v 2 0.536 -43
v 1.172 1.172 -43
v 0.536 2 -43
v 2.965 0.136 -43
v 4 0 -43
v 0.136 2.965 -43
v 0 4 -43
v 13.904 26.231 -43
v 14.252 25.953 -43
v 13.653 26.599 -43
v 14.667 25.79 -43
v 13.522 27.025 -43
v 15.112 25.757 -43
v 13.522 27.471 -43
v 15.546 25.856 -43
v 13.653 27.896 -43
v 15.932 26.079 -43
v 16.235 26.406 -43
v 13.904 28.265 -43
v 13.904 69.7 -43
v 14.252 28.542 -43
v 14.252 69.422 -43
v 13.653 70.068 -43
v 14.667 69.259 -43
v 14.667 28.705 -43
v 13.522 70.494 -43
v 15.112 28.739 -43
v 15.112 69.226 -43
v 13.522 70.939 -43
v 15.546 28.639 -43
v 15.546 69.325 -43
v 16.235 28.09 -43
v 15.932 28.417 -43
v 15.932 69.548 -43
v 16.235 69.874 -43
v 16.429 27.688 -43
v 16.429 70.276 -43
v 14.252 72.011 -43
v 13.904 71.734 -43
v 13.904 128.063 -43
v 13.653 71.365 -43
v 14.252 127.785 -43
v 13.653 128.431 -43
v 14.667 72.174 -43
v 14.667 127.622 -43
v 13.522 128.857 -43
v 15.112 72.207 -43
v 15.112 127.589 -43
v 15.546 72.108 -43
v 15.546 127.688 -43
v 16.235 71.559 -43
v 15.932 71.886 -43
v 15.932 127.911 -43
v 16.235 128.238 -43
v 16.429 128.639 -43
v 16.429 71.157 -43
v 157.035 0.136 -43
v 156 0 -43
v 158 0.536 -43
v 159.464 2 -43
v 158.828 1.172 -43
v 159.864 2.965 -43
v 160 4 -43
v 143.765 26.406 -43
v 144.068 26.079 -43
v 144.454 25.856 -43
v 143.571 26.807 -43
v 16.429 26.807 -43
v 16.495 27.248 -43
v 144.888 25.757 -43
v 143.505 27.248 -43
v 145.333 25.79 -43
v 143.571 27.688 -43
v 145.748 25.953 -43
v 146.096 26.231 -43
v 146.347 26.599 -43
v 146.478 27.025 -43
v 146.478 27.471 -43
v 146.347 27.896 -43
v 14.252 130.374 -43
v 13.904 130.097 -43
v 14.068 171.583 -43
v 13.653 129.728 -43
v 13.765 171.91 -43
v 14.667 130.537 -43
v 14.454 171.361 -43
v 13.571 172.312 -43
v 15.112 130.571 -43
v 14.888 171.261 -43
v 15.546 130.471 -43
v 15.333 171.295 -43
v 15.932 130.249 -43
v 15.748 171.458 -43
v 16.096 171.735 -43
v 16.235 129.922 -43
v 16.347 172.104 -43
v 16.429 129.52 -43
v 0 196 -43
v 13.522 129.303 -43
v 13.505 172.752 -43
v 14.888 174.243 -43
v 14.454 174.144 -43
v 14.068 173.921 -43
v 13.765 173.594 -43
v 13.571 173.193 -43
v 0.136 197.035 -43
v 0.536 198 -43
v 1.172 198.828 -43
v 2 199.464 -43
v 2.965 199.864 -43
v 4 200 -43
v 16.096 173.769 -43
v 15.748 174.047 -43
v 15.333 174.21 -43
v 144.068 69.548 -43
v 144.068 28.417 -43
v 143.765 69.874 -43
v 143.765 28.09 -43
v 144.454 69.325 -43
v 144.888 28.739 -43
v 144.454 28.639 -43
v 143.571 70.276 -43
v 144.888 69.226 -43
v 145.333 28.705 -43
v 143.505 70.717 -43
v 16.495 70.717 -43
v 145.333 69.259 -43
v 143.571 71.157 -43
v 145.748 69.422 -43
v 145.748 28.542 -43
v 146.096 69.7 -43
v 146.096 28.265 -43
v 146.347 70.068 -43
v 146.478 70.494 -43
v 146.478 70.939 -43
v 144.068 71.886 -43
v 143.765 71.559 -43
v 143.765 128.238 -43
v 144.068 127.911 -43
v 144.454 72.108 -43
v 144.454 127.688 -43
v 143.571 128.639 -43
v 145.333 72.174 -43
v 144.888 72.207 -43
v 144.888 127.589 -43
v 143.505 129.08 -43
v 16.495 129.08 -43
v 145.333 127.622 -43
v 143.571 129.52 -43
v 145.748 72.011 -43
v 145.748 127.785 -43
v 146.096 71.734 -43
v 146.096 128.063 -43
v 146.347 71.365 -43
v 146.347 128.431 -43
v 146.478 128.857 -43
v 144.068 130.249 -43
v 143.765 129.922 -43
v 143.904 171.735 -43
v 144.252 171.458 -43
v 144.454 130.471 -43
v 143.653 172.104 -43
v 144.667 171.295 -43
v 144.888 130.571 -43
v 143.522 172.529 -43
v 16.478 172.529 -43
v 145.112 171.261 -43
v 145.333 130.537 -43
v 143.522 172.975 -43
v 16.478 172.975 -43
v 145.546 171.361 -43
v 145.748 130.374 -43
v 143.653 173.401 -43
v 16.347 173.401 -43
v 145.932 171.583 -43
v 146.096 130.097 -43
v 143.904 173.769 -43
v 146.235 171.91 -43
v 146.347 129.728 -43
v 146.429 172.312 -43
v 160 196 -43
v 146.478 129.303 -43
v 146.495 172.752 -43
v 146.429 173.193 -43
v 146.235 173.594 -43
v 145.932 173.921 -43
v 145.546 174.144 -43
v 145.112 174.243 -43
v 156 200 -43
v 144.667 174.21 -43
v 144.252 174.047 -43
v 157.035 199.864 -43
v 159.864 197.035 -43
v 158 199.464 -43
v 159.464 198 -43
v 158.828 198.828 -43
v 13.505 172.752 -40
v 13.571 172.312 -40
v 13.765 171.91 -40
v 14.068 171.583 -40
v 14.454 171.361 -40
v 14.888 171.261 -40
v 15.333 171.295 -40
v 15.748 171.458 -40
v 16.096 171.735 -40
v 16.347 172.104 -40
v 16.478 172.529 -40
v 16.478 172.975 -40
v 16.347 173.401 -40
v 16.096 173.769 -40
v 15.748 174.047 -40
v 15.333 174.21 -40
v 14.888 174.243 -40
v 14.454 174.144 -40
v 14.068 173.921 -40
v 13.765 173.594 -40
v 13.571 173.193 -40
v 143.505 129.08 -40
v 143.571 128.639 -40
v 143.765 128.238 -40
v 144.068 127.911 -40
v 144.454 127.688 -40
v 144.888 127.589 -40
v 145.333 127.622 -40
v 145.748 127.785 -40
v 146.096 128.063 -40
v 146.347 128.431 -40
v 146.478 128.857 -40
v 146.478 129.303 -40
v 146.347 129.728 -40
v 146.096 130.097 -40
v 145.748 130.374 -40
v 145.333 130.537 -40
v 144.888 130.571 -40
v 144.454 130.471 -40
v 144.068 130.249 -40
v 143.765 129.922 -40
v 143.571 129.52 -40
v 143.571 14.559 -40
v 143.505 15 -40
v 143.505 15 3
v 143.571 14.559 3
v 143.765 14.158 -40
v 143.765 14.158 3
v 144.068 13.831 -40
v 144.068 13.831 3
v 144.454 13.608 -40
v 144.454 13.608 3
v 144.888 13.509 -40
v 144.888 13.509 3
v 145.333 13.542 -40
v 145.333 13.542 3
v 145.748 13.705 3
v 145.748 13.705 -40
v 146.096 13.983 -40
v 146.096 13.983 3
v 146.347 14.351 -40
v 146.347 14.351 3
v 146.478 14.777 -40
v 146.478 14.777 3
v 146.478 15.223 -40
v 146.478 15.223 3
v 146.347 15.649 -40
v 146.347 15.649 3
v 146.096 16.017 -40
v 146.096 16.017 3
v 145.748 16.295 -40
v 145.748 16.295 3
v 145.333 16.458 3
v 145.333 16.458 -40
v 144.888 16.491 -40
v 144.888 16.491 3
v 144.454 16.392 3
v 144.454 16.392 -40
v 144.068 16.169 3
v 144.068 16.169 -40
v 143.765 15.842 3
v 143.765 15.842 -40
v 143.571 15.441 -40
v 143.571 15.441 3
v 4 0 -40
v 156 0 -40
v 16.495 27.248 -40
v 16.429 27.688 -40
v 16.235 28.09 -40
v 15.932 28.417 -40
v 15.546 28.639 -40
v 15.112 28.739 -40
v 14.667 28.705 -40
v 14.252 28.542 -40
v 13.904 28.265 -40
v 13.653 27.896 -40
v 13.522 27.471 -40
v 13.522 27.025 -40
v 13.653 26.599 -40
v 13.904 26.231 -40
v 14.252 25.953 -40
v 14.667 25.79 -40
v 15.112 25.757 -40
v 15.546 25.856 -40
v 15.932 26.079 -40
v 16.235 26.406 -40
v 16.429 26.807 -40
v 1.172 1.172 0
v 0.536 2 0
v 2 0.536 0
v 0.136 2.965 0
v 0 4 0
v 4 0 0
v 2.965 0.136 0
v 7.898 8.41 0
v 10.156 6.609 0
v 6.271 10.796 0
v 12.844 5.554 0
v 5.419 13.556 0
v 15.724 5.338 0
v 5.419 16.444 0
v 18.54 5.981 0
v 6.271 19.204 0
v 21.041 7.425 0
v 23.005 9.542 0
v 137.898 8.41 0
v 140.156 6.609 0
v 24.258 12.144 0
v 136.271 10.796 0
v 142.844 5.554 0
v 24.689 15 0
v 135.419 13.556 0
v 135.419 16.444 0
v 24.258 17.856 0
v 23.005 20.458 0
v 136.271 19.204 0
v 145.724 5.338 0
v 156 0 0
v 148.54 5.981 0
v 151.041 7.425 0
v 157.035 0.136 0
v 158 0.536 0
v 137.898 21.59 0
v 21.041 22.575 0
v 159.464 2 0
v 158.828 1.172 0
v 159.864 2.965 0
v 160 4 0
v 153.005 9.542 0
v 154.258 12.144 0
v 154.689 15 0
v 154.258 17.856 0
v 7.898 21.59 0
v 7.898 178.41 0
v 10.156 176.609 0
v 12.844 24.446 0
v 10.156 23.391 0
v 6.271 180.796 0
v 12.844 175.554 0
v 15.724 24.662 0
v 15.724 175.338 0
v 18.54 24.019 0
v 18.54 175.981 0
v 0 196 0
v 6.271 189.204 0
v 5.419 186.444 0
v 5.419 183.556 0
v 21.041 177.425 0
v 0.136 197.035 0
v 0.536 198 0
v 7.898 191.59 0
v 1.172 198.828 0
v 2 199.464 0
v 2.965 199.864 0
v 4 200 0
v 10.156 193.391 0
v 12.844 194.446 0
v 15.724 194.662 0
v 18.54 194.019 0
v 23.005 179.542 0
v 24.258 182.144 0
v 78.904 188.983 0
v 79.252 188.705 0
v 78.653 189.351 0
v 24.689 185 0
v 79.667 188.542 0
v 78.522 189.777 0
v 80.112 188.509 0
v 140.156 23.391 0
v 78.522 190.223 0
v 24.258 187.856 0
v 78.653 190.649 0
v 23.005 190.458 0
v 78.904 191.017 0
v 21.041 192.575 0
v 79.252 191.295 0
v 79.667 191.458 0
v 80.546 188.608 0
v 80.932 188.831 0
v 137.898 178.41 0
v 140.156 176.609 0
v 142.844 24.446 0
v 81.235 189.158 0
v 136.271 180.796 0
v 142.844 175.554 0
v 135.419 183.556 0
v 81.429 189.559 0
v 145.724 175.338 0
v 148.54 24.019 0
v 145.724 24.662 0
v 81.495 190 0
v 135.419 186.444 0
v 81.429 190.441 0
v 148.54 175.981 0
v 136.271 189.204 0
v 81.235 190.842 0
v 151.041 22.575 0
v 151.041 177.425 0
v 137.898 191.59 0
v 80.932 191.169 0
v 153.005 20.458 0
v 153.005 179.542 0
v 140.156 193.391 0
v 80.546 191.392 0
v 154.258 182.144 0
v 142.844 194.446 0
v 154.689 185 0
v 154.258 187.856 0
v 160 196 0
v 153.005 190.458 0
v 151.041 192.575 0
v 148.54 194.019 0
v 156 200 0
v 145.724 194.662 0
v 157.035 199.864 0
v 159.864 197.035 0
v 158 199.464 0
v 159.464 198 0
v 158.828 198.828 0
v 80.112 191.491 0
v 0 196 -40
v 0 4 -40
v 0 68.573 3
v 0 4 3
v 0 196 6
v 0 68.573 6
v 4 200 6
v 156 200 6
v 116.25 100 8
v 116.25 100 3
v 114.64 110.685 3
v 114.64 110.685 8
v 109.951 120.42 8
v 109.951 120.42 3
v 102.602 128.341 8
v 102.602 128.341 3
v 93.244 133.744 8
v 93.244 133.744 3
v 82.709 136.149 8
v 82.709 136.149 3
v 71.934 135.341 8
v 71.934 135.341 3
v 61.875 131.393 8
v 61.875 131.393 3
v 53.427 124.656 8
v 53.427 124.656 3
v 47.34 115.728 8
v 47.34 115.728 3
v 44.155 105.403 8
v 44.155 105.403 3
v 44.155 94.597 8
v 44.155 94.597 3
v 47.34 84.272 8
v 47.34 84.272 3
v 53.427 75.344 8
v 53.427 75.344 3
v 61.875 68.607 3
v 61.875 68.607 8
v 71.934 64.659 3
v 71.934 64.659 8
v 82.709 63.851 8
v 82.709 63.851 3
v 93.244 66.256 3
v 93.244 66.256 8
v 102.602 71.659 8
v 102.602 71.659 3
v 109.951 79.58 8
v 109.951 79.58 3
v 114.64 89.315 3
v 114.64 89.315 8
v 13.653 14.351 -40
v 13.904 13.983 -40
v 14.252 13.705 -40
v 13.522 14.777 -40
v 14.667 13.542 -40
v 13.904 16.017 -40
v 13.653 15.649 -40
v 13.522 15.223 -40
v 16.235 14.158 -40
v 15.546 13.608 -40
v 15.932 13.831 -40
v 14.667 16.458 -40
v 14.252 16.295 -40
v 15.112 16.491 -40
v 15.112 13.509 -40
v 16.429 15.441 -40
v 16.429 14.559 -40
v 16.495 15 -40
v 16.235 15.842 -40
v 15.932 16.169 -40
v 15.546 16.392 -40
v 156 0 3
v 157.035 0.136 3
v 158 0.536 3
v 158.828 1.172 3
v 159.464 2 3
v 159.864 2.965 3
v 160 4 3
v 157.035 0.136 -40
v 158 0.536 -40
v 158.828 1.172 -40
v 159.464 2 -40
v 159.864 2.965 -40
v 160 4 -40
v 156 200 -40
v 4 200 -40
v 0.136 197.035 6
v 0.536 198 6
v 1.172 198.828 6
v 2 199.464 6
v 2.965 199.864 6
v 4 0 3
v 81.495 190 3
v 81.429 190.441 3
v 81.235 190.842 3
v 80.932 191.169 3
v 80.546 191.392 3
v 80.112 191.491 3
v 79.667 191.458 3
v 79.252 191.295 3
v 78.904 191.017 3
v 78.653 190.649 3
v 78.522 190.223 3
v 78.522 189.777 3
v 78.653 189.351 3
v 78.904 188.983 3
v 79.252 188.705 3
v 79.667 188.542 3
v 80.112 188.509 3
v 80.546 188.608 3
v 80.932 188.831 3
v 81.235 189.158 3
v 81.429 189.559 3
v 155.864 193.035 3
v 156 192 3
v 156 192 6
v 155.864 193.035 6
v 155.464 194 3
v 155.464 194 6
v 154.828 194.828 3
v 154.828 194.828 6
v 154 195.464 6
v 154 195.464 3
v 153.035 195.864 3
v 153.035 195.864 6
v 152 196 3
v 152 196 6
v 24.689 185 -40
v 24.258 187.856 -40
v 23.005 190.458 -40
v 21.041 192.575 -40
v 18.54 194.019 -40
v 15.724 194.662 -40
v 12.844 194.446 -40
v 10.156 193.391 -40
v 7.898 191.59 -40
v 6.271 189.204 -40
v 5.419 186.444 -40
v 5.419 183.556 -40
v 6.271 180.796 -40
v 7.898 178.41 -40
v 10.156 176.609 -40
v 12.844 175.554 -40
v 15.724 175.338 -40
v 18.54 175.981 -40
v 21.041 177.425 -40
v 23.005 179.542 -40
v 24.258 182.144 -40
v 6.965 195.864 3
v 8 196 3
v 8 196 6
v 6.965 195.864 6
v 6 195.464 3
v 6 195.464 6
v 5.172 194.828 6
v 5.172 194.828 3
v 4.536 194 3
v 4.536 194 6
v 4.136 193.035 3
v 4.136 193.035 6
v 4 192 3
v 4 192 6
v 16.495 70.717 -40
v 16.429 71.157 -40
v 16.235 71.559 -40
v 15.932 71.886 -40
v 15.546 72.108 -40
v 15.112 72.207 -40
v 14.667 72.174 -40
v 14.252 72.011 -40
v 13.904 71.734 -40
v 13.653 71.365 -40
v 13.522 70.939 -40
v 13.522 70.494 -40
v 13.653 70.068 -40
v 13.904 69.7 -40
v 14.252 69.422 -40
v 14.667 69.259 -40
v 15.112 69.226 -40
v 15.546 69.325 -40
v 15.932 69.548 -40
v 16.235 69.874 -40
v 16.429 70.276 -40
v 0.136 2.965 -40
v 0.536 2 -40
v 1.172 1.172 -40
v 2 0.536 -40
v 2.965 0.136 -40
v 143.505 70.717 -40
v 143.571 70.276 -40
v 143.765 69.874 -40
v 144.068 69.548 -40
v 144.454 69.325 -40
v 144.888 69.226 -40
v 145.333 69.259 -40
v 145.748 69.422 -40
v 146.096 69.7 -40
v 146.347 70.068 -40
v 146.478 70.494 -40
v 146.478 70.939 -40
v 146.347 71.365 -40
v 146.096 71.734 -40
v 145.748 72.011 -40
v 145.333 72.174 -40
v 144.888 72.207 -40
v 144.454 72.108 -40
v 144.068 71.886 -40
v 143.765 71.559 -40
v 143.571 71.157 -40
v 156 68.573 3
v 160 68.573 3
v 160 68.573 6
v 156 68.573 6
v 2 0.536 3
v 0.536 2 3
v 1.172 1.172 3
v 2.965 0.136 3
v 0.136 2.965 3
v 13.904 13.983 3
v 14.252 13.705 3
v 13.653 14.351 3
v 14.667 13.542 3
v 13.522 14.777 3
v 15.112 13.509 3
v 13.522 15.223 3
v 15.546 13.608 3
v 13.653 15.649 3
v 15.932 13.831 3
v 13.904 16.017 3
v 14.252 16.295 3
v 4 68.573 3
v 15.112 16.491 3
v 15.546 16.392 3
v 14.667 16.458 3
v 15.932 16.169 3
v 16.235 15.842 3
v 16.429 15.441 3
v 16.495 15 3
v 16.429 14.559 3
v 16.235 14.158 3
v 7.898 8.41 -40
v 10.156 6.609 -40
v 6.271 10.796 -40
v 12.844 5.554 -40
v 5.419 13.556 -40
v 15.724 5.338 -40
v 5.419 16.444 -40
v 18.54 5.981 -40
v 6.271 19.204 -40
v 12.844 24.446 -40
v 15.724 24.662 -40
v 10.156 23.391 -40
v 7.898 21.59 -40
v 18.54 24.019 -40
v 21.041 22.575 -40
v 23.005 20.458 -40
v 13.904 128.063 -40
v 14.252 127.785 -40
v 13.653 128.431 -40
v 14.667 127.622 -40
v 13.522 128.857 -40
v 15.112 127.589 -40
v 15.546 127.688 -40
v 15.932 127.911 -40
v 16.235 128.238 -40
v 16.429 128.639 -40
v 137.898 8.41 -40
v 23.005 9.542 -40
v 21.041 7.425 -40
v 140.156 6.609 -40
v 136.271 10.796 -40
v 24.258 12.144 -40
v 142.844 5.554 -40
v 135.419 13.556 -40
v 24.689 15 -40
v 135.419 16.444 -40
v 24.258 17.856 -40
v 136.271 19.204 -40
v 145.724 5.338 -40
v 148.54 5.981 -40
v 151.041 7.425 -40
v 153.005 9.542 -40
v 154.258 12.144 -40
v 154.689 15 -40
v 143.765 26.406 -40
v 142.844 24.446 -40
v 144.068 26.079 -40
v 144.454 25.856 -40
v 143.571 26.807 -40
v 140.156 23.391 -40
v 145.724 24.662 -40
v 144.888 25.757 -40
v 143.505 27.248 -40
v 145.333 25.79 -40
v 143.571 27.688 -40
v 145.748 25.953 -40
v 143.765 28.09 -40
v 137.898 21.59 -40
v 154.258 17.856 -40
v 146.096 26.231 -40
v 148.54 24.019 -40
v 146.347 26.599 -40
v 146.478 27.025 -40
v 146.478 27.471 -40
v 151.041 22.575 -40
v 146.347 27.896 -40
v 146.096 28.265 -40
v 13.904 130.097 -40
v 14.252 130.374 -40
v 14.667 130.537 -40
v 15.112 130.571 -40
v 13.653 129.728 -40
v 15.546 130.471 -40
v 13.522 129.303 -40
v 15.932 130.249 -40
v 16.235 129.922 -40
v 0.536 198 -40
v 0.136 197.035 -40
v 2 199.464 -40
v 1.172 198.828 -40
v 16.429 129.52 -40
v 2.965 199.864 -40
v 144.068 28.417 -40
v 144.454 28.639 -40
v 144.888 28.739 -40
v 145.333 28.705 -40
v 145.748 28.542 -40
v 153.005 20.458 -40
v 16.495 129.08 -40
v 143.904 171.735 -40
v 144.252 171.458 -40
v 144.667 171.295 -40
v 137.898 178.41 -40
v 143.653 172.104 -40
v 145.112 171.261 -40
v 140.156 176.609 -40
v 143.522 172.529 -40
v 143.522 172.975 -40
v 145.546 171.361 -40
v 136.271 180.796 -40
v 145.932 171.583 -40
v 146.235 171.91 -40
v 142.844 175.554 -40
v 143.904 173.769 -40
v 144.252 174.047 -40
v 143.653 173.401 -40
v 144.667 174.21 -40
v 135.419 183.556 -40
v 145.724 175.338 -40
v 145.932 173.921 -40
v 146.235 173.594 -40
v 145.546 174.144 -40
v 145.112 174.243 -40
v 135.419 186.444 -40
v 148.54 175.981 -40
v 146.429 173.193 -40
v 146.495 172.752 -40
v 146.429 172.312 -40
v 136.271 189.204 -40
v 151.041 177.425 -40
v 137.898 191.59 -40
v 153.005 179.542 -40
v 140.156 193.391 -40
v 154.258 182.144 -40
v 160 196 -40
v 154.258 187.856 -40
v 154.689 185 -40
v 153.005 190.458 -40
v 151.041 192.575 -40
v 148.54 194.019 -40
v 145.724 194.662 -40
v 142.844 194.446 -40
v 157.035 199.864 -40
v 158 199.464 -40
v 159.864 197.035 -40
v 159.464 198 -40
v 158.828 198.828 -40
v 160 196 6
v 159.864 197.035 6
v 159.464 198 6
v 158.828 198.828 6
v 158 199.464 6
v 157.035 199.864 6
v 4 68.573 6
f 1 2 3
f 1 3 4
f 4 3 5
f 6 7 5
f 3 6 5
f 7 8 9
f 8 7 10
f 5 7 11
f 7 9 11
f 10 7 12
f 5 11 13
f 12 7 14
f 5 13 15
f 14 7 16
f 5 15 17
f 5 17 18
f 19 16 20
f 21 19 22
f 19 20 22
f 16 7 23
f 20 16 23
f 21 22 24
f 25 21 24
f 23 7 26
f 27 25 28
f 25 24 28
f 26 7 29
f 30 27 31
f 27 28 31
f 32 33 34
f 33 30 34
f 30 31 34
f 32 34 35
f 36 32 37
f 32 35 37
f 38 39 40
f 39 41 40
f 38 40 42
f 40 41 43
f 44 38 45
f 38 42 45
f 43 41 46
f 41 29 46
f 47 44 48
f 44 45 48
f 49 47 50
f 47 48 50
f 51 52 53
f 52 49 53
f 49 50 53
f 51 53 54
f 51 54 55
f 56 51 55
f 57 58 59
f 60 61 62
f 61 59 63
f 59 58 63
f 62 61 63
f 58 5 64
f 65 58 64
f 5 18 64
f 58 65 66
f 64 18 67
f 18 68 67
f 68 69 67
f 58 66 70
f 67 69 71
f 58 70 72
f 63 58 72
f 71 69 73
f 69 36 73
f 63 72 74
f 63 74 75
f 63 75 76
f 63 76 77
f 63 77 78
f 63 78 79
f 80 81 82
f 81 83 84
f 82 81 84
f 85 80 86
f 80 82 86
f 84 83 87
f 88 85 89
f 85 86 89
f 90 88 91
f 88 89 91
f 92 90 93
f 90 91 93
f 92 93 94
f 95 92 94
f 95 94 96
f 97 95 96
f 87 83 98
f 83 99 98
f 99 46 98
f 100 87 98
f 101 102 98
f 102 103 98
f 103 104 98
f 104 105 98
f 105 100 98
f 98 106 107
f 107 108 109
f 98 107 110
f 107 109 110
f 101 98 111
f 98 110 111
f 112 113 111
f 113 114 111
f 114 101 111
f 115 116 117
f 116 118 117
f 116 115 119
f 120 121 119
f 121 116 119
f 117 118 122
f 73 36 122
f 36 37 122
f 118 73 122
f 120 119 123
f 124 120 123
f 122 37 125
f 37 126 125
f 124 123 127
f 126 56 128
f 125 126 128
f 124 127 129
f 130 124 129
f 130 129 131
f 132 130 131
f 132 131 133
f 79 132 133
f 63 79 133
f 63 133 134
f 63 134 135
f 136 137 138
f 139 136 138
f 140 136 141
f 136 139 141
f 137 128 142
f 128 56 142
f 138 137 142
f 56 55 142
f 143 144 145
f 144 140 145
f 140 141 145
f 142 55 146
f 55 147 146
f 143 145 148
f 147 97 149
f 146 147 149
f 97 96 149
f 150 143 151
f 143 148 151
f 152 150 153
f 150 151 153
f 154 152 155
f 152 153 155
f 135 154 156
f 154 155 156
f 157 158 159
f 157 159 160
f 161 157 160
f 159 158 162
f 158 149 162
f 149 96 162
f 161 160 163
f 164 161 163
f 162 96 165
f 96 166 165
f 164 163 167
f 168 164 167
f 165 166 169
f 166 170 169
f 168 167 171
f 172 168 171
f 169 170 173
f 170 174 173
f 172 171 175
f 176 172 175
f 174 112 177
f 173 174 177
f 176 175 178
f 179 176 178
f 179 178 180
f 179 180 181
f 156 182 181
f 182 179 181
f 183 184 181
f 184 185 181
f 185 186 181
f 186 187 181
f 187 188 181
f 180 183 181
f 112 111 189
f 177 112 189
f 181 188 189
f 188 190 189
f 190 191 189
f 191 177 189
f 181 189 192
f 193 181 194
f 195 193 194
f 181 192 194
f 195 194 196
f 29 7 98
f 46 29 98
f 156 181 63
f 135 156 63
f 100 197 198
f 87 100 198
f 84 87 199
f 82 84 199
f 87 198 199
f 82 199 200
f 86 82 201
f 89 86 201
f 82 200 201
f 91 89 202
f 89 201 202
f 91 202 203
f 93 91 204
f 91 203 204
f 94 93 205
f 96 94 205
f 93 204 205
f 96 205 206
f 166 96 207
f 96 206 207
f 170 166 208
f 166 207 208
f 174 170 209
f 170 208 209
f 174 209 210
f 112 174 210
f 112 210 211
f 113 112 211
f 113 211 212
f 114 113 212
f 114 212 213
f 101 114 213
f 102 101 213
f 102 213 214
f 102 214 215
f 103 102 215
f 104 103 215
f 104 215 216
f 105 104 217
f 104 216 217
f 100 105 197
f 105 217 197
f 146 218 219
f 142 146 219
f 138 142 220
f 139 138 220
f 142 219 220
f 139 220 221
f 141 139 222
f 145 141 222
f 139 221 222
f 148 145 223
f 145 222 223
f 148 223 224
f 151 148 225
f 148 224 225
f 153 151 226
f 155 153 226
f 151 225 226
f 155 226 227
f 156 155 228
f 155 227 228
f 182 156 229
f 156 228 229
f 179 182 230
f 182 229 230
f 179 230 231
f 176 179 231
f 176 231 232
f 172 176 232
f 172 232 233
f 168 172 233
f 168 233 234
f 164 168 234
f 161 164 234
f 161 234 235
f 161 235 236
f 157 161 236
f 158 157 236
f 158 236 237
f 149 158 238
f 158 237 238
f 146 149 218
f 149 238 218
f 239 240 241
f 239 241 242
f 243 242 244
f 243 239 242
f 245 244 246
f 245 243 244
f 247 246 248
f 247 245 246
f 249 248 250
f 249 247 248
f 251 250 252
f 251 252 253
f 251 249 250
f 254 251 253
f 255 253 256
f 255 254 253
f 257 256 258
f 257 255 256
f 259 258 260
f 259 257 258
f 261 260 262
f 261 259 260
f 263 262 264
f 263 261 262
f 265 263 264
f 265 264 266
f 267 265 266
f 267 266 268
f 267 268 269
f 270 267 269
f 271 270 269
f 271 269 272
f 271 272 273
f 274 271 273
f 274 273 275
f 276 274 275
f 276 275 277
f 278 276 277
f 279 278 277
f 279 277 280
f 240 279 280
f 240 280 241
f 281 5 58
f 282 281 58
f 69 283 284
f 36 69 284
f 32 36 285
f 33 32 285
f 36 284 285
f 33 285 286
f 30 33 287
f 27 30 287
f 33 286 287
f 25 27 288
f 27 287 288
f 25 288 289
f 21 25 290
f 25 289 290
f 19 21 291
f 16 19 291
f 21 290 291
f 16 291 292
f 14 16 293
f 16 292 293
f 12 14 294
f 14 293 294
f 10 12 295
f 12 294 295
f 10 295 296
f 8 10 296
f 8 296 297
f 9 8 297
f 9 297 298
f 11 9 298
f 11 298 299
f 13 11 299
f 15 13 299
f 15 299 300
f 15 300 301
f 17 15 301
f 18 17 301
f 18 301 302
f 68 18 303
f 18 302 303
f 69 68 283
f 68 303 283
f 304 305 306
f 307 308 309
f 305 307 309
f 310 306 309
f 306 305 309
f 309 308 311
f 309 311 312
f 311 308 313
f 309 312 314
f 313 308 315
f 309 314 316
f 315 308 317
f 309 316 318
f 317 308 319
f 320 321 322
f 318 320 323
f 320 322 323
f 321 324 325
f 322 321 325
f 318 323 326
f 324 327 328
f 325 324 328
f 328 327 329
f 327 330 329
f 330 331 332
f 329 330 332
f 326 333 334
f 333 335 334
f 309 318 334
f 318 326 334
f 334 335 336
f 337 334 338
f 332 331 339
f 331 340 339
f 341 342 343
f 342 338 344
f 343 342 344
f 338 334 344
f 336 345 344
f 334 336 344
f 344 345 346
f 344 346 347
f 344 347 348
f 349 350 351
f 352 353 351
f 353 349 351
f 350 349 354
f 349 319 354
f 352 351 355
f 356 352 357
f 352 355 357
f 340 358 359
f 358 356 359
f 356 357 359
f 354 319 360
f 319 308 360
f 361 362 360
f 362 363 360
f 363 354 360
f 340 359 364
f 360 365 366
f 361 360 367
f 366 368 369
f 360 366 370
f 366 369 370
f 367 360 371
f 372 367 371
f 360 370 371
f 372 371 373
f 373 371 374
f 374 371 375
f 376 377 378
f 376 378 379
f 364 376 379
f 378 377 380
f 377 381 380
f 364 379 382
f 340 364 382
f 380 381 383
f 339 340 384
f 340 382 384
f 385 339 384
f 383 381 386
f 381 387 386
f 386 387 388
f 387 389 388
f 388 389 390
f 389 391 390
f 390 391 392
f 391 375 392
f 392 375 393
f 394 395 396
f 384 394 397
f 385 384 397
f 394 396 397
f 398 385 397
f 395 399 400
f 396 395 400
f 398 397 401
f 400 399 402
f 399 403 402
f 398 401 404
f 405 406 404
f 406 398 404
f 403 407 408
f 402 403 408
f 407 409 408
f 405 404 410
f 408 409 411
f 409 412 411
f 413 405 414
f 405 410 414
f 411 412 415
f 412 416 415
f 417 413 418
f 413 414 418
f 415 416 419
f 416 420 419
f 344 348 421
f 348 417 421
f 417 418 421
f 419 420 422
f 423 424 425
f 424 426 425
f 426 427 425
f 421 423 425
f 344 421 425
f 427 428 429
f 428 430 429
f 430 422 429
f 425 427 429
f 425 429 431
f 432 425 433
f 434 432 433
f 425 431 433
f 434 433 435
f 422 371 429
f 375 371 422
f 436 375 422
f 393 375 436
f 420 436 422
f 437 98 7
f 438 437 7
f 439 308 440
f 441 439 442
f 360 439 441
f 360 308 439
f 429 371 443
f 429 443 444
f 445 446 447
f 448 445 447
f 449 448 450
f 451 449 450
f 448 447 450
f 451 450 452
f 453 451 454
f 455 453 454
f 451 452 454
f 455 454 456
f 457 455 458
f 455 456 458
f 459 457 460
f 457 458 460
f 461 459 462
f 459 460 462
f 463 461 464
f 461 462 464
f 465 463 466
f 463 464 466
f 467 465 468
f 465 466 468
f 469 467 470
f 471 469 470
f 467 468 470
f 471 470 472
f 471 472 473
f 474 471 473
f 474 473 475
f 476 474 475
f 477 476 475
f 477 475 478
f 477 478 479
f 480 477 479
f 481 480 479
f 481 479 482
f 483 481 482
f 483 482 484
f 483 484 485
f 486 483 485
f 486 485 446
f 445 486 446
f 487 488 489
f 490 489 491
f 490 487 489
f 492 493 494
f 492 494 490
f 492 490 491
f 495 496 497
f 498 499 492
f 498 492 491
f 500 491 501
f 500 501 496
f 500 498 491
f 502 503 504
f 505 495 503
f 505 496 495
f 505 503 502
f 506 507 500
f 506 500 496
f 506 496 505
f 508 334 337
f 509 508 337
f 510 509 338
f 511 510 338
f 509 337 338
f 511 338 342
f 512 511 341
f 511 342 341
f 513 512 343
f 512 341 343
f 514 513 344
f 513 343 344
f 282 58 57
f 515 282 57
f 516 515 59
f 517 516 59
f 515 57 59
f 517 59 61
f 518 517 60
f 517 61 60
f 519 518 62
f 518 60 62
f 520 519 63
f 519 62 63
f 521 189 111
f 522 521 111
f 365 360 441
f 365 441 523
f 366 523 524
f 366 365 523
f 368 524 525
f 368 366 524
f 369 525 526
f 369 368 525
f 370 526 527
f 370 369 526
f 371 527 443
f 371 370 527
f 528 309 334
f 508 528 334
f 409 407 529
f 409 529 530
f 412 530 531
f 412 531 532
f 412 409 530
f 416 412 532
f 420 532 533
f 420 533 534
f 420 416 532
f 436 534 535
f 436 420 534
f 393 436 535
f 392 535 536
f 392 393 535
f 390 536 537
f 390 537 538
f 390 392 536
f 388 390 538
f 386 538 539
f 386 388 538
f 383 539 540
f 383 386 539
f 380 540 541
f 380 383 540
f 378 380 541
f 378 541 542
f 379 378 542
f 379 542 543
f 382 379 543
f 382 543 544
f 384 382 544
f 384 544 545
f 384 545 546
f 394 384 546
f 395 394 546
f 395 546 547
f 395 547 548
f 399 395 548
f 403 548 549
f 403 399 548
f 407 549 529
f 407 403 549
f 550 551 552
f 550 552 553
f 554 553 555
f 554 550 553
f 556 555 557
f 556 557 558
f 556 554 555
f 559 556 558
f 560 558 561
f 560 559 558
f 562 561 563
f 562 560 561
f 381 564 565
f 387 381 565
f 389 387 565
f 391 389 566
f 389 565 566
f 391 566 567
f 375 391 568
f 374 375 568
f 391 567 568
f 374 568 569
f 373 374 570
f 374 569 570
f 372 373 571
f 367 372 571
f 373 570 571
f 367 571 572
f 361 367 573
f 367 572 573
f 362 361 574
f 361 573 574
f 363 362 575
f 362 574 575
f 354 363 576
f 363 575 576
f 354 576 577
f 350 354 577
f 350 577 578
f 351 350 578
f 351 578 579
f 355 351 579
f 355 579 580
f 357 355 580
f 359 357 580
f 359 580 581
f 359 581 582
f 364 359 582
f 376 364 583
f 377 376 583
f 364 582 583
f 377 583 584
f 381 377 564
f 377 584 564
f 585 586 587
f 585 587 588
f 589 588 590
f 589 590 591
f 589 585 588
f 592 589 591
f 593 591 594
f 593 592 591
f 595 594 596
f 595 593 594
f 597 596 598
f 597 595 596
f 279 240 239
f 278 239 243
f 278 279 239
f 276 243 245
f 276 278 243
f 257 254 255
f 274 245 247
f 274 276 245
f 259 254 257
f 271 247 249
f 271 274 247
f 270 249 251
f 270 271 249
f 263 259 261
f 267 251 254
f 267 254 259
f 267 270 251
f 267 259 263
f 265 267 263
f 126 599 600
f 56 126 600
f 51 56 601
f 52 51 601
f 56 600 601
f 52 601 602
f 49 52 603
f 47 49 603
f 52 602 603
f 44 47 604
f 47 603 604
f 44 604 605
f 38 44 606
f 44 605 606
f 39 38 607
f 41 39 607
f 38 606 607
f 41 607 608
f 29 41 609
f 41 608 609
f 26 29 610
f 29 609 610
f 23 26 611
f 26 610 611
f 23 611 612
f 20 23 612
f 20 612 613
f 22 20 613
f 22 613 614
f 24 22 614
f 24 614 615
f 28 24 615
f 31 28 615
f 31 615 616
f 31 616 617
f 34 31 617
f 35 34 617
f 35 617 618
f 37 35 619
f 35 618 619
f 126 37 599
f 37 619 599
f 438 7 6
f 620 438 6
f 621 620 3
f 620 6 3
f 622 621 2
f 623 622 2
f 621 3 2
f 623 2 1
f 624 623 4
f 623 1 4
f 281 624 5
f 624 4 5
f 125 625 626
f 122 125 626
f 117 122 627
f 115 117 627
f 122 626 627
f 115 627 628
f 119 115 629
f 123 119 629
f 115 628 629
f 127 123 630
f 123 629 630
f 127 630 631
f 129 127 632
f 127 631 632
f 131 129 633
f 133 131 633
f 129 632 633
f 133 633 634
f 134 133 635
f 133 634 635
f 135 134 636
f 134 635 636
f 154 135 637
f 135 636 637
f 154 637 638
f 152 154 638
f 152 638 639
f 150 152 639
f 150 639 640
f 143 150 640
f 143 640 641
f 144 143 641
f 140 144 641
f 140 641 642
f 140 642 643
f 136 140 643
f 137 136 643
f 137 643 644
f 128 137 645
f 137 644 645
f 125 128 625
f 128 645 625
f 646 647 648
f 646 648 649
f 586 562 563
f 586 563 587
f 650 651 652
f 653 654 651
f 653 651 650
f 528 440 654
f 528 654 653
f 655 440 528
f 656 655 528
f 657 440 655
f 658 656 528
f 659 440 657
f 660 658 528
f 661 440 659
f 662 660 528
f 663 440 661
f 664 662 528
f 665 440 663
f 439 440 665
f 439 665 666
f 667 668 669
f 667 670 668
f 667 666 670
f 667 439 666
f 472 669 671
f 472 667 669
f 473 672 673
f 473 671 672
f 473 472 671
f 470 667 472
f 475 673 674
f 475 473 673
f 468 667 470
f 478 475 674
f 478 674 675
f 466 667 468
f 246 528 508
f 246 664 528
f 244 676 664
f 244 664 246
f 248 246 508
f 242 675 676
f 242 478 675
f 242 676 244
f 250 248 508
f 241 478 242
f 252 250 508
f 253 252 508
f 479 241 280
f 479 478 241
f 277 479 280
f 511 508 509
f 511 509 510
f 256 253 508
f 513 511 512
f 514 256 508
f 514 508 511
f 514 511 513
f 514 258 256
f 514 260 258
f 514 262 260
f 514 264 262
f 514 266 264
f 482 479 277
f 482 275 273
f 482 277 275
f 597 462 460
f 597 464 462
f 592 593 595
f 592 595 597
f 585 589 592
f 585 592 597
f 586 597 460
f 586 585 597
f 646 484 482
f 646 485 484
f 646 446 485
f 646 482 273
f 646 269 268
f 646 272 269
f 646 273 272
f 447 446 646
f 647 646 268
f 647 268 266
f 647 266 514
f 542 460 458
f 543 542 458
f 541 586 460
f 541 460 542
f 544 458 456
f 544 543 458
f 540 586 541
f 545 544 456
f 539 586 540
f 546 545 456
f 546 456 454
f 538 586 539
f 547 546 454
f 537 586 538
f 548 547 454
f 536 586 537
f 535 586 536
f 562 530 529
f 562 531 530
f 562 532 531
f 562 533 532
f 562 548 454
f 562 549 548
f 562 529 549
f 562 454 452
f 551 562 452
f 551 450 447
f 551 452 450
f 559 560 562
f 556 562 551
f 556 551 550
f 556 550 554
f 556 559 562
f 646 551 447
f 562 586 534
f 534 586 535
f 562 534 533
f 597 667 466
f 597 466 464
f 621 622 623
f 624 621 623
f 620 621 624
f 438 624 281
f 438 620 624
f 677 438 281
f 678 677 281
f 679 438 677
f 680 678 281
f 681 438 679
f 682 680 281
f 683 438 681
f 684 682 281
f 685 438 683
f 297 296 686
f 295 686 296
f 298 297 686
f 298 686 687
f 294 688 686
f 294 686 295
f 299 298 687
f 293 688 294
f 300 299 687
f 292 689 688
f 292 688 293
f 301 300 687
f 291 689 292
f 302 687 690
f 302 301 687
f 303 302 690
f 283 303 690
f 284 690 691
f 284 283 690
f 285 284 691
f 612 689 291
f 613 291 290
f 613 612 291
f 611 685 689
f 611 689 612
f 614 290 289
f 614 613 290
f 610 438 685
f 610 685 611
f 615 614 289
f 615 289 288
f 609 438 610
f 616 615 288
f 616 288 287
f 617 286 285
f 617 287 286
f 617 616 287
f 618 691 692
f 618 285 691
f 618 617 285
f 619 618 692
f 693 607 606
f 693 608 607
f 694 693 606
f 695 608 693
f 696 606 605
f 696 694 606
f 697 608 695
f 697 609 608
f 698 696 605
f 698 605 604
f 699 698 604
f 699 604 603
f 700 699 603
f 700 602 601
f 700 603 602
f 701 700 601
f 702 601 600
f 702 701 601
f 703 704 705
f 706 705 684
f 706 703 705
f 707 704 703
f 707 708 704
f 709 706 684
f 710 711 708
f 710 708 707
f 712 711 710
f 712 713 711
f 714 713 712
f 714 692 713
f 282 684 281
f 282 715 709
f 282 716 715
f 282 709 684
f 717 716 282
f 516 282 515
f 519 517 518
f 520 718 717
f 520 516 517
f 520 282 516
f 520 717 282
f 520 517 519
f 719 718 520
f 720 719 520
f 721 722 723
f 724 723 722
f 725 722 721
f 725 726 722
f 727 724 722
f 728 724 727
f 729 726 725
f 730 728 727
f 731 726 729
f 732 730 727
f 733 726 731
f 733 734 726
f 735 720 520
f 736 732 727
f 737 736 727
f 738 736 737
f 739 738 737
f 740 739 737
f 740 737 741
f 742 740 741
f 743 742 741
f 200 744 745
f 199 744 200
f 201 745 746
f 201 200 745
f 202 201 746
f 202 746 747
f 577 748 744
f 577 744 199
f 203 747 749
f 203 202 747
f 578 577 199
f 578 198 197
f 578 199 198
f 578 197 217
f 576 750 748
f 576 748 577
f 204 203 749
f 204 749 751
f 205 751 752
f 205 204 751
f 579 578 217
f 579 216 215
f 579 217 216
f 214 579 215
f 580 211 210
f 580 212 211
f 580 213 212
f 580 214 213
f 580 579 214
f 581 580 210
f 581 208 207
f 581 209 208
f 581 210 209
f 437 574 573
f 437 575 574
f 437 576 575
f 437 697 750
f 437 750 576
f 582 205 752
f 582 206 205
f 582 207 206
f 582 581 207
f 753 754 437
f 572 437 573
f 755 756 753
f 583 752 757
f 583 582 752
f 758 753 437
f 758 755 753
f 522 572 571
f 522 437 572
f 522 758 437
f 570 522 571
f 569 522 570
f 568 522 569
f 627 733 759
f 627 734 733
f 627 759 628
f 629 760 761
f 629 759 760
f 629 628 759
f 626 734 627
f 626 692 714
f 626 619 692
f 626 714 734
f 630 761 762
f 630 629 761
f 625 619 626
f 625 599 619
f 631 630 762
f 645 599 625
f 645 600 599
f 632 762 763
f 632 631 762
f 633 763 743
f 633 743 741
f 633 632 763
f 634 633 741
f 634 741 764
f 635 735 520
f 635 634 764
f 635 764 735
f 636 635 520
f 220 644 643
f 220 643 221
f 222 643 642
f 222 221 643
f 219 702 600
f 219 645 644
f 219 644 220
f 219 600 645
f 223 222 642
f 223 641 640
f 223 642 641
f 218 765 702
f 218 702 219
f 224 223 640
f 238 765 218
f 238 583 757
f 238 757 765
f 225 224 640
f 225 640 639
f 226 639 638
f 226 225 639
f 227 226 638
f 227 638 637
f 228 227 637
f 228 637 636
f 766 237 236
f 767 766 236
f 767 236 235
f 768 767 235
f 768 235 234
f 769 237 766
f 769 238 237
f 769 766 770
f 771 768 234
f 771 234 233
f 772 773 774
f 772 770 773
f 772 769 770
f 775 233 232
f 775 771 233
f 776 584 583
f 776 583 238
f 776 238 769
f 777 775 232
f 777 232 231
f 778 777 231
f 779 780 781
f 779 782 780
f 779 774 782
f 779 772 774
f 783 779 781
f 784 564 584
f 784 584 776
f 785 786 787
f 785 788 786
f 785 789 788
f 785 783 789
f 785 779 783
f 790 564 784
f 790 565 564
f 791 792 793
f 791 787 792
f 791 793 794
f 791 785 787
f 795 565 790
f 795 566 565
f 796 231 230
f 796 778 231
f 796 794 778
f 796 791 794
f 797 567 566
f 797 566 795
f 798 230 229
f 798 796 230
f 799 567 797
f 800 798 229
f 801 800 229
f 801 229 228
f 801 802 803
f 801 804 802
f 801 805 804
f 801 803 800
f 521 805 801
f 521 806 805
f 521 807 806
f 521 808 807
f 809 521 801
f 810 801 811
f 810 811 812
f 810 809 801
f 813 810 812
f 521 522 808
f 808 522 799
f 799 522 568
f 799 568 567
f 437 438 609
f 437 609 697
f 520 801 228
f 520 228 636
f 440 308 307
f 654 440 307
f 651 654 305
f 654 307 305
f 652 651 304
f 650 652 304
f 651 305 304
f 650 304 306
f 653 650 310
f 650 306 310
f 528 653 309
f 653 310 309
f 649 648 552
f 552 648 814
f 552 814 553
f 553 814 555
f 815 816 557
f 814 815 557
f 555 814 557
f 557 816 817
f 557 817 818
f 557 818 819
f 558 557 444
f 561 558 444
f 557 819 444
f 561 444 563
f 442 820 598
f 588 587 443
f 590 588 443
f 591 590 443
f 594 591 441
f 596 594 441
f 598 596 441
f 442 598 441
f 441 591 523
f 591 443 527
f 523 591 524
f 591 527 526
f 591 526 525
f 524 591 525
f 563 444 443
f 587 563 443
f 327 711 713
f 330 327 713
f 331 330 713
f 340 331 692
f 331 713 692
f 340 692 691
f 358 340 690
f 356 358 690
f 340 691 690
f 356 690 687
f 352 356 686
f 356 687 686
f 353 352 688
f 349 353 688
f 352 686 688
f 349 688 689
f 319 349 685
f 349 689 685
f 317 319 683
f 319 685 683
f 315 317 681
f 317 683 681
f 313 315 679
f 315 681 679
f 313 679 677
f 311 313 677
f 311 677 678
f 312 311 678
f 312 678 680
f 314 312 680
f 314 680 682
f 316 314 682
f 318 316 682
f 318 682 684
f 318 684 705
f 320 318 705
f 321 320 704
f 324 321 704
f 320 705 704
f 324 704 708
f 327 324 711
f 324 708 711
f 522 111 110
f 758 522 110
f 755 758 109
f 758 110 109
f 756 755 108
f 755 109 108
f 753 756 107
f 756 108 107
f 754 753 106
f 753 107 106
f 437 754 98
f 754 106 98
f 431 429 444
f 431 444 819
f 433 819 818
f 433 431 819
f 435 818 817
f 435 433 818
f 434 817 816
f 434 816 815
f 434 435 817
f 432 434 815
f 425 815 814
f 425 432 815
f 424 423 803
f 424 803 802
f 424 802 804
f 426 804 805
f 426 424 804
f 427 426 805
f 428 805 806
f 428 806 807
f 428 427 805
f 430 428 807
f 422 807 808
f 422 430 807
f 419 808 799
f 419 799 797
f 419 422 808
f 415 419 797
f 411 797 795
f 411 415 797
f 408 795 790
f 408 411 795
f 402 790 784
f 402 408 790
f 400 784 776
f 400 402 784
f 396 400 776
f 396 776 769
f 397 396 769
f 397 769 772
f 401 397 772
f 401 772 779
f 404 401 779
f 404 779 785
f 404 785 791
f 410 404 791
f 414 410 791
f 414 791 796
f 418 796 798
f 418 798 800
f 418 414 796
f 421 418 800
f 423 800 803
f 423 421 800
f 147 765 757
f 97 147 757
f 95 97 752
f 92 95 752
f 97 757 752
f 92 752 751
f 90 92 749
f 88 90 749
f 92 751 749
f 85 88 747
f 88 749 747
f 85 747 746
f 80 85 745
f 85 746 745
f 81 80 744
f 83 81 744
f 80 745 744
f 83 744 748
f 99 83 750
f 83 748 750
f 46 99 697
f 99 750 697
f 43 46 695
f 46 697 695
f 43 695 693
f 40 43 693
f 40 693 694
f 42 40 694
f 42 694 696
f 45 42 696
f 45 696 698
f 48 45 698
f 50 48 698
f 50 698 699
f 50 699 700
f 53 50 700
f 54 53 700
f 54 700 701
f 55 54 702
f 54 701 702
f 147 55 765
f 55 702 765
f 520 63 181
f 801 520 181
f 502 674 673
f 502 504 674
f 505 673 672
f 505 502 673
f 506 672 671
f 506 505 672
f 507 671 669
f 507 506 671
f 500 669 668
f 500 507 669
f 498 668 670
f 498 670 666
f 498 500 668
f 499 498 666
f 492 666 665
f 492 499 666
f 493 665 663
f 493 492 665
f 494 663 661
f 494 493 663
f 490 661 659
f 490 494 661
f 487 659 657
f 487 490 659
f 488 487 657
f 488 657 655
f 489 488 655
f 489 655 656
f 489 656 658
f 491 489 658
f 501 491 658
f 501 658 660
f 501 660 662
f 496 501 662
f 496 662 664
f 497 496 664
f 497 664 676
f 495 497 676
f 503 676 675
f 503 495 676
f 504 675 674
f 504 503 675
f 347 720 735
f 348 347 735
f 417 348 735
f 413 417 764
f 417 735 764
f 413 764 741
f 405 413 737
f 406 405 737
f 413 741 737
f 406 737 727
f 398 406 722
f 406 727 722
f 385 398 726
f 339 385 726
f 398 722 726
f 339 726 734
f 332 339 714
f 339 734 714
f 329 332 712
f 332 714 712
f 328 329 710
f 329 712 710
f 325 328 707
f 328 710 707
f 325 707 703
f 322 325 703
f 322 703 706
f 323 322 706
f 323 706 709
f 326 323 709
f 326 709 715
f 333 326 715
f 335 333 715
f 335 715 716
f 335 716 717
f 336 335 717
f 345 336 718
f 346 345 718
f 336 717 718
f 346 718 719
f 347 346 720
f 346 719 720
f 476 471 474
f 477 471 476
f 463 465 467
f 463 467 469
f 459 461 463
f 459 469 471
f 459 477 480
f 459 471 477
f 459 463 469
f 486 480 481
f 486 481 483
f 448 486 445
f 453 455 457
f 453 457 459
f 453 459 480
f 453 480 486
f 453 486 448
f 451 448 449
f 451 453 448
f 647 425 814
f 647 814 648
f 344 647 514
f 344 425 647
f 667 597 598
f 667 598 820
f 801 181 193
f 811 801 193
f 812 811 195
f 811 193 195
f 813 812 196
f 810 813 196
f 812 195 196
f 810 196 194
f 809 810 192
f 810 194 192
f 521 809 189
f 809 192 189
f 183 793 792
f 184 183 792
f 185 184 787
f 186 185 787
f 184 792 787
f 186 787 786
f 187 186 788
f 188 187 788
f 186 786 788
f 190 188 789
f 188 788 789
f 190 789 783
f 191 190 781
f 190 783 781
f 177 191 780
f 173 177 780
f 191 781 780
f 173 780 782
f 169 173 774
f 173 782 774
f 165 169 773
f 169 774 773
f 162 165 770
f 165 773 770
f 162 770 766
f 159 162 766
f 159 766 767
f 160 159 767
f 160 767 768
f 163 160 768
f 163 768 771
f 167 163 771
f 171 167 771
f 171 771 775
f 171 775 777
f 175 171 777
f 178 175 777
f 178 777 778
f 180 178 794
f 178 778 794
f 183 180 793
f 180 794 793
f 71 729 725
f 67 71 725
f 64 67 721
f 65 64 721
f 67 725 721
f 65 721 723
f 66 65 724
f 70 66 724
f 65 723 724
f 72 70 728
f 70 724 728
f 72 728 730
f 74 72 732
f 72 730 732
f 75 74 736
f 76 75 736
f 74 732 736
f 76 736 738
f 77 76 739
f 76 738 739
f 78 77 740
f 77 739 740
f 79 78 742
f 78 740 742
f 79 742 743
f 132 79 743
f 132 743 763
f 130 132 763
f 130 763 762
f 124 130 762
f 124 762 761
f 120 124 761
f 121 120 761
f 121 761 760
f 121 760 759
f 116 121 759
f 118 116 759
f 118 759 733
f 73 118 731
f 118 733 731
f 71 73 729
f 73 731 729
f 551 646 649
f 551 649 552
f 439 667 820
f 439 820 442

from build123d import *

# Parameters (mm, degrees)
SKETCH1_R           = 36.25
SKETCH1_R_2         = 1.495
BOSS_EXTRUDE1_DEPTH = 3
SKETCH1_3_R         = 1.495
CUT_EXTRUDE2_DEPTH  = 3
SKETCH1_4_R         = 1.495
CUT_EXTRUDE3_DEPTH  = 3
SKETCH1_6_R         = 9.688899653
BOSS_EXTRUDE2_DEPTH = 40
BOSS_EXTRUDE3_START = -40
SKETCH1_7_R         = 9.688899653
SKETCH1_7_R_2       = 1.495
BOSS_EXTRUDE3_DEPTH = 40
BOSS_EXTRUDE4_START = 3
BOSS_EXTRUDE4_DEPTH = 3
SKETCH1_8_R         = 36.25
BOSS_EXTRUDE5_DEPTH = 8
BOSS_EXTRUDE6_DEPTH = 3
SKETCH4_R           = 1.495
CUT_EXTRUDE4_DEPTH  = 3


with BuildPart() as part:
    # Sketch1 → Boss-Extrude1 (new body)
    with BuildSketch(Plane.XY):
        with BuildLine():
            ThreePointArc((0, 4), (1.171572875, 1.171572875), (4, 0))
            Line((4, 0), (156, 0))
            ThreePointArc((156, 0), (158.828427125, 1.171572875), (160, 4))
            Line((160, 4), (160, 196))
            ThreePointArc((160, 196), (158.828427125, 198.828427125), (156, 200))
            Line((156, 200), (4, 200))
            ThreePointArc((4, 200), (1.171572875, 198.828427125), (0, 196))
            Line((0, 196), (0, 4))
        make_face()
        with Locations((80, 100)):
            Circle(SKETCH1_R, mode=Mode.SUBTRACT)
        with Locations((80, 190)):
            Circle(SKETCH1_R_2, mode=Mode.SUBTRACT)
    extrude(amount=BOSS_EXTRUDE1_DEPTH)

    # Sketch1<3> → Cut-Extrude2 (cut)
    with BuildSketch(Plane.XY):
        with Locations((15, 15)):
            Circle(SKETCH1_3_R)
    extrude(amount=CUT_EXTRUDE2_DEPTH, mode=Mode.SUBTRACT)

    # Sketch1<4> → Cut-Extrude3 (cut)
    with BuildSketch(Plane.XY):
        with Locations((145, 15)):
            Circle(SKETCH1_4_R)
    extrude(amount=CUT_EXTRUDE3_DEPTH, mode=Mode.SUBTRACT)

    # Sketch1<6> → Boss-Extrude2 (add)
    with BuildSketch(Plane.XY):
        with Locations((145, 185)):
            Circle(SKETCH1_6_R)
    extrude(amount=-BOSS_EXTRUDE2_DEPTH)

    # Sketch1<7> → Boss-Extrude3 (add)
    # profile 1 of 3: a face of its own
    with BuildSketch(Plane.XY.offset(BOSS_EXTRUDE3_START)):
        with Locations((15, 15)):
            Circle(SKETCH1_7_R)
        with Locations((15, 15)):
            Circle(SKETCH1_7_R_2, mode=Mode.SUBTRACT)
    # profile 2 of 3: a face of its own
    with BuildSketch(Plane.XY.offset(BOSS_EXTRUDE3_START)):
        with Locations((145, 15)):
            Circle(SKETCH1_7_R)
        with Locations((145, 15)):
            Circle(SKETCH1_7_R_2, mode=Mode.SUBTRACT)
    # profile 3 of 3: a face of its own
    with BuildSketch(Plane.XY.offset(BOSS_EXTRUDE3_START)):
        with Locations((15, 185)):
            Circle(SKETCH1_7_R)
    extrude(amount=BOSS_EXTRUDE3_DEPTH)

    # Sketch2 → Boss-Extrude4 (add)
    with BuildSketch(Plane(origin=(0, 0, -40), x_dir=(-1, 0, 0), z_dir=(0, 0, -1)).offset(BOSS_EXTRUDE4_START)):
        with BuildLine():
            Line((-156, 200), (-4, 200))
            ThreePointArc((-4, 200), (-1.171572875, 198.828427125), (0, 196))
            Line((0, 196), (0, 4))
            ThreePointArc((0, 4), (-1.171572875, 1.171572875), (-4, 0))
            Line((-4, 0), (-156, 0))
            ThreePointArc((-156, 0), (-158.828427125, 1.171572875), (-160, 4))
            Line((-160, 4), (-160, 196))
            ThreePointArc((-160, 196), (-158.828427125, 198.828427125), (-156, 200))
        make_face()
    extrude(amount=-BOSS_EXTRUDE4_DEPTH)

    # Sketch1<8> → Boss-Extrude5 (add)
    with BuildSketch(Plane.XY):
        with Locations((80, 100)):
            Circle(SKETCH1_8_R)
    extrude(amount=BOSS_EXTRUDE5_DEPTH)

    # Sketch3 → Boss-Extrude6 (add)
    with BuildSketch(Plane.XY.offset(3)):
        with BuildLine():
            Line((0, 68.573310073), (0, 196))
            ThreePointArc((0, 196), (1.171572875, 198.828427125), (4, 200))
            Line((4, 200), (156, 200))
            ThreePointArc((156, 200), (158.828427125, 198.828427125), (160, 196))
            Line((160, 196), (160, 68.573310073))
            Line((160, 68.573310073), (156, 68.573310073))
            Line((156, 68.573310073), (156, 192))
            ThreePointArc((156, 192), (154.828427125, 194.828427125), (152, 196))
            Line((152, 196), (8, 196))
            ThreePointArc((8, 196), (5.171572875, 194.828427125), (4, 192))
            Line((4, 192), (4, 68.573310073))
            Line((4, 68.573310073), (0, 68.573310073))
        make_face()
    extrude(amount=BOSS_EXTRUDE6_DEPTH)

    # Sketch4 → Cut-Extrude4 (cut)
    with BuildSketch(Plane.XY.offset(-40)):
        with Locations((15, 27.247777485)):
            Circle(SKETCH4_R)
        with Locations((145, 27.247777485)):
            Circle(SKETCH4_R)
        with Locations((145, 172.752222515)):
            Circle(SKETCH4_R)
        with Locations((15, 172.752222515)):
            Circle(SKETCH4_R)
        with Locations((15, 129.079723254)):
            Circle(SKETCH4_R)
        with Locations((15, 70.716662913)):
            Circle(SKETCH4_R)
        with Locations((145, 70.716662913)):
            Circle(SKETCH4_R)
        with Locations((145, 129.079723254)):
            Circle(SKETCH4_R)
    extrude(amount=-CUT_EXTRUDE4_DEPTH, mode=Mode.SUBTRACT)


solid = part.part
